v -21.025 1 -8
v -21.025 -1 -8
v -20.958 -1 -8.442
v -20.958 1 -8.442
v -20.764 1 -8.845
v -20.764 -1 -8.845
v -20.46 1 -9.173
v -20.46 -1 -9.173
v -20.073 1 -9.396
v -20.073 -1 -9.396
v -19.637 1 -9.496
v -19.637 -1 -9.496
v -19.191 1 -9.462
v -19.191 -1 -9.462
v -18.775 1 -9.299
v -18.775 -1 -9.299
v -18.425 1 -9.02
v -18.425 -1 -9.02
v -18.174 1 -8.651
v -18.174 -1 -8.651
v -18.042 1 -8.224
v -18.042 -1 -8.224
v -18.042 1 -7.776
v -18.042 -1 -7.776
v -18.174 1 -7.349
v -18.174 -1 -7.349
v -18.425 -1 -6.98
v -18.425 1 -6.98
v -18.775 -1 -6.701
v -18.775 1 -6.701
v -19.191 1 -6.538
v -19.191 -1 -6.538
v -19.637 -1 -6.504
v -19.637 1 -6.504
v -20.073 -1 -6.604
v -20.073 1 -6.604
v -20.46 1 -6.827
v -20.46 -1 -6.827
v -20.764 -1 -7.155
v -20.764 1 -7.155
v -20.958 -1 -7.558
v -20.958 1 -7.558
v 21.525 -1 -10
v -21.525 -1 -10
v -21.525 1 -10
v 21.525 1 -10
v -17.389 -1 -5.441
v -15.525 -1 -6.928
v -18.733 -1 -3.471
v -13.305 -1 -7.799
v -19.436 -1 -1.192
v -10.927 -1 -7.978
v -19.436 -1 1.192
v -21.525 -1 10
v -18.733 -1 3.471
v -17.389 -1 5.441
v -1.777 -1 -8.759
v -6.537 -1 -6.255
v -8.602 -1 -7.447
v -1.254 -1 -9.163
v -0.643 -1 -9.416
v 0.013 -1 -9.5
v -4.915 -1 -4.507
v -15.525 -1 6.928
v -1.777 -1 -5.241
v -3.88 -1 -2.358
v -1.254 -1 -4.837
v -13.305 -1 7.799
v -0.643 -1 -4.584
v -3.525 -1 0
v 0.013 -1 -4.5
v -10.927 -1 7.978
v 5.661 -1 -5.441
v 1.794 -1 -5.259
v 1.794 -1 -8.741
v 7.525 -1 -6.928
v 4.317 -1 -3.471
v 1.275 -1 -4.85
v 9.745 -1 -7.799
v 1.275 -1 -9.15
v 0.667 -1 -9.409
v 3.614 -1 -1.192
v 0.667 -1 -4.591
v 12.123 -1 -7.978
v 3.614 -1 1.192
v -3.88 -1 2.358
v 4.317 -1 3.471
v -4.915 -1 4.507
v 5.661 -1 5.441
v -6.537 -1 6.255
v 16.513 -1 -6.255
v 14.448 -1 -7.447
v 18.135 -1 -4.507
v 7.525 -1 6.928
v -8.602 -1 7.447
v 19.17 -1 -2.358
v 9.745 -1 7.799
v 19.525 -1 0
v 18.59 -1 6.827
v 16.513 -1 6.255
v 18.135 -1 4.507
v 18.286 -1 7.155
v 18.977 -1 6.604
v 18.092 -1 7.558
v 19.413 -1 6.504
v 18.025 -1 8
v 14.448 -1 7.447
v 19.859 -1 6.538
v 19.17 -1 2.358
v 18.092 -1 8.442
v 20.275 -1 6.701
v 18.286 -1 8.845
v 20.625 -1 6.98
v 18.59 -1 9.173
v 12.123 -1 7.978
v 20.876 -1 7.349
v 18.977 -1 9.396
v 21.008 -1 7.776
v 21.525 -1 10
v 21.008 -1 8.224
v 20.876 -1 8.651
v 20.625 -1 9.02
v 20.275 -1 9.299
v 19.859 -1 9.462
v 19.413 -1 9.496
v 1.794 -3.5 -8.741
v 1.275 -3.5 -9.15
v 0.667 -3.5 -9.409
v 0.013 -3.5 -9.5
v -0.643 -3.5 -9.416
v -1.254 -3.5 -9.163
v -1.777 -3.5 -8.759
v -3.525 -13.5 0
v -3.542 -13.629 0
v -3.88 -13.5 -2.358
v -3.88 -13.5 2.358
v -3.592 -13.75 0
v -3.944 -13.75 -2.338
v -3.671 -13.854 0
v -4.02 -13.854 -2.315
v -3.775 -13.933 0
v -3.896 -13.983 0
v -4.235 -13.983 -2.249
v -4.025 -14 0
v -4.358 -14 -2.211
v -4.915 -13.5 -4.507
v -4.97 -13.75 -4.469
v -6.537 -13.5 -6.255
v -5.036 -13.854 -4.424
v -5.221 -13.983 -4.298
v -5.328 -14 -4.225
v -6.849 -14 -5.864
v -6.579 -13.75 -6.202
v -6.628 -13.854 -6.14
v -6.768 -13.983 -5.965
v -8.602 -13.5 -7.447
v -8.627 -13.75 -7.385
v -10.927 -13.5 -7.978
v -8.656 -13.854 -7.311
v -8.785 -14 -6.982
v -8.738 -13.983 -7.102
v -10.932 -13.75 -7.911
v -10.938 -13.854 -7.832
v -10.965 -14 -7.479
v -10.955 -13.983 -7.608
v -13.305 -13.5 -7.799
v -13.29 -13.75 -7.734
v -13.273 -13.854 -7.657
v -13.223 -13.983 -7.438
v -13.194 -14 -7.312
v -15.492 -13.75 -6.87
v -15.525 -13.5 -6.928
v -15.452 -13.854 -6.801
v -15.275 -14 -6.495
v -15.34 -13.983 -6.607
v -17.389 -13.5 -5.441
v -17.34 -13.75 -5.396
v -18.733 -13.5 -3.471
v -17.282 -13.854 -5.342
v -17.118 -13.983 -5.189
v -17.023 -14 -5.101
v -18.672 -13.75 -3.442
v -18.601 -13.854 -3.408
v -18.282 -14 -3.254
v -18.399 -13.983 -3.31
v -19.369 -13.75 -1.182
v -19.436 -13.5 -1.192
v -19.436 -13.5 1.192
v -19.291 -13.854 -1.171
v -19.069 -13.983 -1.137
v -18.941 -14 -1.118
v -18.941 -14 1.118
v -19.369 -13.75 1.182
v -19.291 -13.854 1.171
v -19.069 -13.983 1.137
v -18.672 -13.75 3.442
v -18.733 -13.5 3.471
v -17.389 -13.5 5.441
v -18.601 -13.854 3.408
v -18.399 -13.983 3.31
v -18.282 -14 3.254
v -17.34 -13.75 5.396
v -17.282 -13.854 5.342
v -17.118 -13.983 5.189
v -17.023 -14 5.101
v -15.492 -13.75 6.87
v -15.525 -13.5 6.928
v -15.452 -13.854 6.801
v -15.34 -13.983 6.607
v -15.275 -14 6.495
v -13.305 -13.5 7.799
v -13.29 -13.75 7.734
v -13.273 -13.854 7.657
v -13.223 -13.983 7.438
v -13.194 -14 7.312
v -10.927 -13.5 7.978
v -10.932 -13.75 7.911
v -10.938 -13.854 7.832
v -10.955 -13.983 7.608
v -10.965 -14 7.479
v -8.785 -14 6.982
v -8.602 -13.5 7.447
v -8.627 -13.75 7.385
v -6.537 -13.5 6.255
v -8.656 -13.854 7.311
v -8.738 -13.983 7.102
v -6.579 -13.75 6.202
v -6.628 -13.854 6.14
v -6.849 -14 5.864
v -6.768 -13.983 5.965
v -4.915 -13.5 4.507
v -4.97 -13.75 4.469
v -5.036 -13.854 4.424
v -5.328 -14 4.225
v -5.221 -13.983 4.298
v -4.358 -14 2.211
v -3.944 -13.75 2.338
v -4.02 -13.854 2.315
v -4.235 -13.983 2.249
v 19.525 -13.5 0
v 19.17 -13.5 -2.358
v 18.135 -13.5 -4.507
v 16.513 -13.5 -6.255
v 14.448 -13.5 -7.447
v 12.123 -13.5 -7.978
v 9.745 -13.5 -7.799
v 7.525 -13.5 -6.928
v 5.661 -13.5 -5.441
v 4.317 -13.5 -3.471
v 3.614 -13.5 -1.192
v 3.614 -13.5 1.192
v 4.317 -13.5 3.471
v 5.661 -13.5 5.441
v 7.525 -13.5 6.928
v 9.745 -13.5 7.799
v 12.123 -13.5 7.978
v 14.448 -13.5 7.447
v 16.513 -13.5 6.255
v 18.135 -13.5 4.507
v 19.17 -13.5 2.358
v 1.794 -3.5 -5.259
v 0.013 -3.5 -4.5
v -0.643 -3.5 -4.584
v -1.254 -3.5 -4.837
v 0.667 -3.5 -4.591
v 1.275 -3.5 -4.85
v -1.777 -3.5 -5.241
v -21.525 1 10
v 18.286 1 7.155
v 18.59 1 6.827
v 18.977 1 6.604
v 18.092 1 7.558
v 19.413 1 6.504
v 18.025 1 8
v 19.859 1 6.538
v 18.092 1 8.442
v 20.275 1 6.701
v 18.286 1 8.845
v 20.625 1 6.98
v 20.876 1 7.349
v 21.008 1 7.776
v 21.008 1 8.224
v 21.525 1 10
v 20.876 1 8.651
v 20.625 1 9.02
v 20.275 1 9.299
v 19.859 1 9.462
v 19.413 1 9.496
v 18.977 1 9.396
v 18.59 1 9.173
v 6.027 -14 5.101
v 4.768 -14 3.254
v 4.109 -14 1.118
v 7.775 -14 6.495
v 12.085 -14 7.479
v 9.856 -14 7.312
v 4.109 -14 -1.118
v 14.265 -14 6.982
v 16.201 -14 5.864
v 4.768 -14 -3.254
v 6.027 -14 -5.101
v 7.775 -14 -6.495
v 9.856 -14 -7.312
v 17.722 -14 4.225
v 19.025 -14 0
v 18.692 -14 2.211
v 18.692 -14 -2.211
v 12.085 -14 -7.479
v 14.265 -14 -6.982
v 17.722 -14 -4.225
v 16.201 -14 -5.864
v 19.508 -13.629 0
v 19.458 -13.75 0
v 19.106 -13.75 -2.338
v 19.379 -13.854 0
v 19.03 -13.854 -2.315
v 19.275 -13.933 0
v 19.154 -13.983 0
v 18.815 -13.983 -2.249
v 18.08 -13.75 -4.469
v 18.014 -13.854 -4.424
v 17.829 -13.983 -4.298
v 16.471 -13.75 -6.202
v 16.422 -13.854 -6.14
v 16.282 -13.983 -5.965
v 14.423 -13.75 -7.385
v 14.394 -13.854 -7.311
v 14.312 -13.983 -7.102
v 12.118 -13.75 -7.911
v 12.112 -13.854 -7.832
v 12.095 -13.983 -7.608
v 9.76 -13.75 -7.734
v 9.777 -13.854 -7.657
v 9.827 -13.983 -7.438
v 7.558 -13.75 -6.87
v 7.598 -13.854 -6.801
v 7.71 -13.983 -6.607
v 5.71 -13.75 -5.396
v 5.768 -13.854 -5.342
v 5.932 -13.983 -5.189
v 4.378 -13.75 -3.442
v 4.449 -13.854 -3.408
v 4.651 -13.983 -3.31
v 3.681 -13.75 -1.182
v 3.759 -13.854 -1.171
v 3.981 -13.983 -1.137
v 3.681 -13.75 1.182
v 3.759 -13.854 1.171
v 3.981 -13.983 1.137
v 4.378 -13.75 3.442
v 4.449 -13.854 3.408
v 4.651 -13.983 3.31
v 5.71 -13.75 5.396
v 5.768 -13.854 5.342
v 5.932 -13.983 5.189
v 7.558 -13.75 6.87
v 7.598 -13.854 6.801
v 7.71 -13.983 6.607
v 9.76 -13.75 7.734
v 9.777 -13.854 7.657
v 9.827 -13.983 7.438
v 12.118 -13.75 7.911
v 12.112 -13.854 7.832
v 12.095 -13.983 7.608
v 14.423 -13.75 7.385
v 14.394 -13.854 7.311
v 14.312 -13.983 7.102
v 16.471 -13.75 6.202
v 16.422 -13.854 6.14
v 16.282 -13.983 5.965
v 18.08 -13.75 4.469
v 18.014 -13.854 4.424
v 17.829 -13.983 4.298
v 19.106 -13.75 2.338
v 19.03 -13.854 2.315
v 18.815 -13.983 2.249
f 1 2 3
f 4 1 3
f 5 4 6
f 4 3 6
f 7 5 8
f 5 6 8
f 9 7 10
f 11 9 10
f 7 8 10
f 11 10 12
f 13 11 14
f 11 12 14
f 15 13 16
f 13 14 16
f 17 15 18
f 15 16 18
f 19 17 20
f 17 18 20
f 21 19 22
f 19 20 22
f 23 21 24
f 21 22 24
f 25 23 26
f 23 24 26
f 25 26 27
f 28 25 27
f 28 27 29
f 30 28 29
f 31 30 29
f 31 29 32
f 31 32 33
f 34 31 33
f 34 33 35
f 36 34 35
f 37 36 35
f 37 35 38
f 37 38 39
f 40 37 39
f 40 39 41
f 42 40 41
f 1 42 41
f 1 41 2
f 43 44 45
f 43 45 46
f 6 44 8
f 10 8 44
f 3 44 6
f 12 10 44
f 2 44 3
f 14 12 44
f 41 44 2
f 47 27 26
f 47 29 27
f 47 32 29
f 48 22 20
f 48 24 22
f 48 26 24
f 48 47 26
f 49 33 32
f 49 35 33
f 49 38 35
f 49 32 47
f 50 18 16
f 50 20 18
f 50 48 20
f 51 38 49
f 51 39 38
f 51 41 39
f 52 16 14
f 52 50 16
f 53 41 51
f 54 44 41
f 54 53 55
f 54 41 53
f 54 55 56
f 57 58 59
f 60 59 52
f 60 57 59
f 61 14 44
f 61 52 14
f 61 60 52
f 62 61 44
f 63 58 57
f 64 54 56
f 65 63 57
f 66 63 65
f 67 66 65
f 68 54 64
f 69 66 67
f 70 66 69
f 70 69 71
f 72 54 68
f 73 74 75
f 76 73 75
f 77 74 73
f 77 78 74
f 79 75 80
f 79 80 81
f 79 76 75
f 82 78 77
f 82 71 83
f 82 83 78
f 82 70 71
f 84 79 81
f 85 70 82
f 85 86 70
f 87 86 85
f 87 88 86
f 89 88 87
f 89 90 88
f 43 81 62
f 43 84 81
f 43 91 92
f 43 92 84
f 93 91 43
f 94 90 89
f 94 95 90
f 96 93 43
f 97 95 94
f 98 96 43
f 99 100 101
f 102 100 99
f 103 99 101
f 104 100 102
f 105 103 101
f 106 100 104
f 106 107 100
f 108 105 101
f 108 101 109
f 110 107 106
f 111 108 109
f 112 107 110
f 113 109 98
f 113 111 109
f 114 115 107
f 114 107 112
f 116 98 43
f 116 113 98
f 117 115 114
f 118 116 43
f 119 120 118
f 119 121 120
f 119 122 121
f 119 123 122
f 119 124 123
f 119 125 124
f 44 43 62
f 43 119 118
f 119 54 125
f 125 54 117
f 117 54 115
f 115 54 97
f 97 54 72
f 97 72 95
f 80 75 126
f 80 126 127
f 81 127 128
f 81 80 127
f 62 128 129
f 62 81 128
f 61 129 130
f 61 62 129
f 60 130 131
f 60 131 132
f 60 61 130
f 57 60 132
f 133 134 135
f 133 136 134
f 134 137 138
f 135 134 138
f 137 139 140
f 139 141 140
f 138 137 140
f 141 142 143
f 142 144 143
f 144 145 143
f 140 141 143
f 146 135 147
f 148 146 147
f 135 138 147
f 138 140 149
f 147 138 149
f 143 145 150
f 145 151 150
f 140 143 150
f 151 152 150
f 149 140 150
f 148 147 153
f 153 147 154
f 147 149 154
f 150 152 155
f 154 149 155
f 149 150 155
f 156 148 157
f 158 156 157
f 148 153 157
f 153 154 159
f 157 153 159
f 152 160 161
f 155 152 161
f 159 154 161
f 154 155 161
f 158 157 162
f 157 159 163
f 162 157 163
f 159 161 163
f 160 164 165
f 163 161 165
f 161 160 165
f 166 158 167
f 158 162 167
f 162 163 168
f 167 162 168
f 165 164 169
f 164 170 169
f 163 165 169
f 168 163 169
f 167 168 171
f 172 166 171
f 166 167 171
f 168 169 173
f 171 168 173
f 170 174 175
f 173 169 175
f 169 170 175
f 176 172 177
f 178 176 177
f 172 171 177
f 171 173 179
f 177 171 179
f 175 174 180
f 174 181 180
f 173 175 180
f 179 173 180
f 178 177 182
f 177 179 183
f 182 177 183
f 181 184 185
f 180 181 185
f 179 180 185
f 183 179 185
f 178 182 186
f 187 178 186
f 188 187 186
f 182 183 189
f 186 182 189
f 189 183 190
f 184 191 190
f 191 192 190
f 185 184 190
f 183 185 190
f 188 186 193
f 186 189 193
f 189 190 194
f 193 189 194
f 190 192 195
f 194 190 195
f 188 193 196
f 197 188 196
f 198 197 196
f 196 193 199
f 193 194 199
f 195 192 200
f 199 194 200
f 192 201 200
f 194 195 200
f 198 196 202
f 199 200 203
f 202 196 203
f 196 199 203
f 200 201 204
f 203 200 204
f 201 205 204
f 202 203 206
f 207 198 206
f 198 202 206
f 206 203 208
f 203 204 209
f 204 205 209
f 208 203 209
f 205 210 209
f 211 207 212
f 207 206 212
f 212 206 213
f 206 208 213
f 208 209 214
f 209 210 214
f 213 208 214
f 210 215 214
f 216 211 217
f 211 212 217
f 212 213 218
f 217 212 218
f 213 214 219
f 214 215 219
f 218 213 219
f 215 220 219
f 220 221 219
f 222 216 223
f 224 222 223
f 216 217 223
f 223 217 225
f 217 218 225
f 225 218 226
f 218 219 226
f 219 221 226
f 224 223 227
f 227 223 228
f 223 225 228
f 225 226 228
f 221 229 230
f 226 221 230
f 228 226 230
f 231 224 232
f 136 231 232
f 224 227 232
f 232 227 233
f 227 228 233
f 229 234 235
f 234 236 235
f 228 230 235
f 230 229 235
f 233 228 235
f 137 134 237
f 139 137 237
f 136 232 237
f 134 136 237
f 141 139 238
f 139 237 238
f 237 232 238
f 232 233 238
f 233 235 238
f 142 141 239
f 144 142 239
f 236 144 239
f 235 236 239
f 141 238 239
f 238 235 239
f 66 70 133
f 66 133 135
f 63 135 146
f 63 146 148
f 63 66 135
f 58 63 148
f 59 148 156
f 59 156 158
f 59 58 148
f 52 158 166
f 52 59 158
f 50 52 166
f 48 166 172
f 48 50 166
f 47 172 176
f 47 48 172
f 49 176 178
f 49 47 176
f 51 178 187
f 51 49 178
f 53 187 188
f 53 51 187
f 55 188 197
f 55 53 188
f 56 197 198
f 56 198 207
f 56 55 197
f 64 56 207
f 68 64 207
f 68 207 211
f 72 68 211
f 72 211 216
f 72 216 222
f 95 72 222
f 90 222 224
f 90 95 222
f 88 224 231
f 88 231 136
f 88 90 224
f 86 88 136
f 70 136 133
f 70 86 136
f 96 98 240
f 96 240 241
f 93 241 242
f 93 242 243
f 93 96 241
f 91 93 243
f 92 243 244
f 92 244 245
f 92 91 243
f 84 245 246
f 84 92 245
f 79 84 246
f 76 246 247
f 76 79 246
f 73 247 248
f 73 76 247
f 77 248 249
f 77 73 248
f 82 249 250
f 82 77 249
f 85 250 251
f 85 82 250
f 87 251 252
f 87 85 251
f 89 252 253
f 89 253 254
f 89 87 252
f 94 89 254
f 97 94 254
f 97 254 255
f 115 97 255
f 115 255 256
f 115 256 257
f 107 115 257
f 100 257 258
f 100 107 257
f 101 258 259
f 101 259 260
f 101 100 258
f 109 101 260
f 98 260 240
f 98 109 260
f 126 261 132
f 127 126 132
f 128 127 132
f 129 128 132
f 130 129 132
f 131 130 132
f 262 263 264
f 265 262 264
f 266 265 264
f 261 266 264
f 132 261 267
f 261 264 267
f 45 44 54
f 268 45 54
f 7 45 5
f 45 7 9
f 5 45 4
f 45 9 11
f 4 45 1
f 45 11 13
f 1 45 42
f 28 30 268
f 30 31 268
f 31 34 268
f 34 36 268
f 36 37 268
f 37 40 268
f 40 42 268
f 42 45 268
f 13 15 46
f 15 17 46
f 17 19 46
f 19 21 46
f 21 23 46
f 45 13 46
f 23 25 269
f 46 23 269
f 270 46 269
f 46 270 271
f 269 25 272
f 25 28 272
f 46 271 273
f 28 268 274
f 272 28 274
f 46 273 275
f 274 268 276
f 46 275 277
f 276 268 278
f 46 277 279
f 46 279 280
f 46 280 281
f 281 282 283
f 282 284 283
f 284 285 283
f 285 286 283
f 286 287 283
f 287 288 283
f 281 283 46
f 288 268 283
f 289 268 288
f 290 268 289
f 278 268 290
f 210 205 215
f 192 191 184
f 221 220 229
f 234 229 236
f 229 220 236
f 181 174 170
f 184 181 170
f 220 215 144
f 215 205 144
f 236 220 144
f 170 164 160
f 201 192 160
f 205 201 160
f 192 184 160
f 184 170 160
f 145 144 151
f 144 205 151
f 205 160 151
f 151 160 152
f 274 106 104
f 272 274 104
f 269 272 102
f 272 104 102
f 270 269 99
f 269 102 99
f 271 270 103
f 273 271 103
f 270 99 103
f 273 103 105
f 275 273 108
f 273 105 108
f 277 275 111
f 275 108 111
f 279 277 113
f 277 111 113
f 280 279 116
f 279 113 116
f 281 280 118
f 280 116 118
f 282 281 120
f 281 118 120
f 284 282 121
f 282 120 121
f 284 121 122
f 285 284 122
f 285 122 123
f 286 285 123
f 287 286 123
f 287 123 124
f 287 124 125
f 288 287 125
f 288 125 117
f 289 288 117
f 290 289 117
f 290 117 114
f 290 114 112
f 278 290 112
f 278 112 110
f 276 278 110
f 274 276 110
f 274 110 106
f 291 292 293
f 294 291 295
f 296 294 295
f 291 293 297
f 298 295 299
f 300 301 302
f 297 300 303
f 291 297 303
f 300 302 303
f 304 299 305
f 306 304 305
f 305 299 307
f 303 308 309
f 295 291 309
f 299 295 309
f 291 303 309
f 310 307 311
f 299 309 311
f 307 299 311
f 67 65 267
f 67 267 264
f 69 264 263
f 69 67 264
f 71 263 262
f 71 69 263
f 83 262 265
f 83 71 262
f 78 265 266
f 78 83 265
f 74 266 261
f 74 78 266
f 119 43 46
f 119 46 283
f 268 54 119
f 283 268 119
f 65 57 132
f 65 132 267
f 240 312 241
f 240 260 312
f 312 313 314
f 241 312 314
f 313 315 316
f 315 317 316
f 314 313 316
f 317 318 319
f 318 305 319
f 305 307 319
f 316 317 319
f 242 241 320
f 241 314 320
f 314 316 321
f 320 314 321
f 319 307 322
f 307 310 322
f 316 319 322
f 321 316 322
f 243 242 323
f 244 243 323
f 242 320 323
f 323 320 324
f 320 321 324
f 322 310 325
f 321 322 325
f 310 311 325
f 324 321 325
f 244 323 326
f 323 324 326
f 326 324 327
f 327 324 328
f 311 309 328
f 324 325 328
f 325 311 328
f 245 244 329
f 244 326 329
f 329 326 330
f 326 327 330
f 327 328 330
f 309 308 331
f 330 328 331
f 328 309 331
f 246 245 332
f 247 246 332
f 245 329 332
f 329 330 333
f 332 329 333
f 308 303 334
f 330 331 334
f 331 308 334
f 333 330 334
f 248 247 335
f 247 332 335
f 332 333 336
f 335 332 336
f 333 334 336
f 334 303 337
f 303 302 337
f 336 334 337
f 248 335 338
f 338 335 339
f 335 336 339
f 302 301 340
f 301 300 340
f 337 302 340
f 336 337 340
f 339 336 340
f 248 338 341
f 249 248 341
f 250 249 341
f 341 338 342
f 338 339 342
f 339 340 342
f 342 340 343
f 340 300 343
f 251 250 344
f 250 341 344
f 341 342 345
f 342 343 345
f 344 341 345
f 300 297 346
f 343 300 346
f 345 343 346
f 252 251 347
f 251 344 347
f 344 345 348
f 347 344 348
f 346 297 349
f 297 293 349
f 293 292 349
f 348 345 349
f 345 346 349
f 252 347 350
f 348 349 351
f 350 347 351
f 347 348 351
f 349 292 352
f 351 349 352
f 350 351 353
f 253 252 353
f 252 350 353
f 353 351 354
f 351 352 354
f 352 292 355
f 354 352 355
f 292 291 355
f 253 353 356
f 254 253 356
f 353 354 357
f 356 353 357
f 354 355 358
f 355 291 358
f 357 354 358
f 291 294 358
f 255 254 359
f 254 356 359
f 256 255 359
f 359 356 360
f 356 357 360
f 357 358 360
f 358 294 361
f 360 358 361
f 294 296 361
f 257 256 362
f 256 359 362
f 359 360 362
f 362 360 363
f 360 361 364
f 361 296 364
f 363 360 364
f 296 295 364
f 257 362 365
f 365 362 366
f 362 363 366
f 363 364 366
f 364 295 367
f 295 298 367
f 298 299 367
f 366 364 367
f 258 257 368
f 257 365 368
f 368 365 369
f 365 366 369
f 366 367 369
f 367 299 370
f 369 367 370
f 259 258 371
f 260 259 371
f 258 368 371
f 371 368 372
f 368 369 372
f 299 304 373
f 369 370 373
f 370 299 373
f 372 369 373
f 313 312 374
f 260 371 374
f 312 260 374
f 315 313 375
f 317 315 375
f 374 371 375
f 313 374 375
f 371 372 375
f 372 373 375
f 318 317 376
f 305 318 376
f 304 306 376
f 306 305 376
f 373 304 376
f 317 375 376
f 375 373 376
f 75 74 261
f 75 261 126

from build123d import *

# Parameters (mm, degrees)
SCHIZZO1_W                   = 43.05
SCHIZZO1_H                   = 20
ESTRUSIONE_ESTRUSIONE1_DEPTH = 2
ESTRUSIONE_ESTRUSIONE2_DEPTH = 2.5
SCHIZZO3_W                   = 8
SCHIZZO3_H                   = 13
SCHIZZO4_W                   = 8
SCHIZZO4_H                   = 13
FORO_3_0_3_1_D               = 3
FORO_3_0_3_1_DEPTH           = 15
RACCORDO1_R                  = 0.5


with BuildPart() as part:
    # Schizzo1 → Estrusione-Estrusione1 (new body)
    with BuildSketch(Plane.XZ.offset(1)):
        Rectangle(SCHIZZO1_W, SCHIZZO1_H)
    extrude(amount=-ESTRUSIONE_ESTRUSIONE1_DEPTH)

    # Schizzo2 → Estrusione-Estrusione2 (add)
    with BuildSketch(Plane.XZ.offset(1)):
        with BuildLine():
            Line((-1.776510899, -8.758979541), (-1.776510899, -5.241020459))
            ThreePointArc((-1.776510899, -5.241020459), (0.01258154, -4.500031659), (1.794125223, -5.258990326))
            Line((1.794125223, -5.258990326), (1.794125223, -8.741009674))
            ThreePointArc((1.794125223, -8.741009674), (0.01258154, -9.499968341), (-1.776510899, -8.758979541))
        make_face()
    extrude(amount=ESTRUSIONE_ESTRUSIONE2_DEPTH)

    # Schizzo3 → Rivoluzione1 (revolve)
    with BuildSketch(Plane(origin=(0, 0, 0), x_dir=(-1, 0, 0), z_dir=(0, 0, -1))):
        with Locations((7.525, -7.5)):
            Rectangle(SCHIZZO3_W, SCHIZZO3_H)
    revolve(axis=Axis((-11.525, -14, 0), (0, 1, 0)))

    # Schizzo4 → Rivoluzione2 (revolve)
    with BuildSketch(Plane(origin=(0, 0, 0), x_dir=(-1, 0, 0), z_dir=(0, 0, -1))):
        with Locations((-15.525, -7.5)):
            Rectangle(SCHIZZO4_W, SCHIZZO4_H)
    revolve(axis=Axis((11.525, -14, 0), (0, 1, 0)))

    # Foro Ø3.0 (3)-1
    with Locations(Plane(origin=(0, 1, 0), x_dir=(1, 0, 0), z_dir=(0, 1, 0))):
        with Locations((-19.525, 8), (19.525, -8)):
            Hole(FORO_3_0_3_1_D / 2, depth=FORO_3_0_3_1_DEPTH)

    # Raccordo1
    raccordo1_edges = [part.edges().sort_by_distance(p)[0] for p in [
        (-19.525, -14, 0),
        (3.525, -14, 0),
    ]]
    fillet(raccordo1_edges, radius=RACCORDO1_R)


solid = part.part
